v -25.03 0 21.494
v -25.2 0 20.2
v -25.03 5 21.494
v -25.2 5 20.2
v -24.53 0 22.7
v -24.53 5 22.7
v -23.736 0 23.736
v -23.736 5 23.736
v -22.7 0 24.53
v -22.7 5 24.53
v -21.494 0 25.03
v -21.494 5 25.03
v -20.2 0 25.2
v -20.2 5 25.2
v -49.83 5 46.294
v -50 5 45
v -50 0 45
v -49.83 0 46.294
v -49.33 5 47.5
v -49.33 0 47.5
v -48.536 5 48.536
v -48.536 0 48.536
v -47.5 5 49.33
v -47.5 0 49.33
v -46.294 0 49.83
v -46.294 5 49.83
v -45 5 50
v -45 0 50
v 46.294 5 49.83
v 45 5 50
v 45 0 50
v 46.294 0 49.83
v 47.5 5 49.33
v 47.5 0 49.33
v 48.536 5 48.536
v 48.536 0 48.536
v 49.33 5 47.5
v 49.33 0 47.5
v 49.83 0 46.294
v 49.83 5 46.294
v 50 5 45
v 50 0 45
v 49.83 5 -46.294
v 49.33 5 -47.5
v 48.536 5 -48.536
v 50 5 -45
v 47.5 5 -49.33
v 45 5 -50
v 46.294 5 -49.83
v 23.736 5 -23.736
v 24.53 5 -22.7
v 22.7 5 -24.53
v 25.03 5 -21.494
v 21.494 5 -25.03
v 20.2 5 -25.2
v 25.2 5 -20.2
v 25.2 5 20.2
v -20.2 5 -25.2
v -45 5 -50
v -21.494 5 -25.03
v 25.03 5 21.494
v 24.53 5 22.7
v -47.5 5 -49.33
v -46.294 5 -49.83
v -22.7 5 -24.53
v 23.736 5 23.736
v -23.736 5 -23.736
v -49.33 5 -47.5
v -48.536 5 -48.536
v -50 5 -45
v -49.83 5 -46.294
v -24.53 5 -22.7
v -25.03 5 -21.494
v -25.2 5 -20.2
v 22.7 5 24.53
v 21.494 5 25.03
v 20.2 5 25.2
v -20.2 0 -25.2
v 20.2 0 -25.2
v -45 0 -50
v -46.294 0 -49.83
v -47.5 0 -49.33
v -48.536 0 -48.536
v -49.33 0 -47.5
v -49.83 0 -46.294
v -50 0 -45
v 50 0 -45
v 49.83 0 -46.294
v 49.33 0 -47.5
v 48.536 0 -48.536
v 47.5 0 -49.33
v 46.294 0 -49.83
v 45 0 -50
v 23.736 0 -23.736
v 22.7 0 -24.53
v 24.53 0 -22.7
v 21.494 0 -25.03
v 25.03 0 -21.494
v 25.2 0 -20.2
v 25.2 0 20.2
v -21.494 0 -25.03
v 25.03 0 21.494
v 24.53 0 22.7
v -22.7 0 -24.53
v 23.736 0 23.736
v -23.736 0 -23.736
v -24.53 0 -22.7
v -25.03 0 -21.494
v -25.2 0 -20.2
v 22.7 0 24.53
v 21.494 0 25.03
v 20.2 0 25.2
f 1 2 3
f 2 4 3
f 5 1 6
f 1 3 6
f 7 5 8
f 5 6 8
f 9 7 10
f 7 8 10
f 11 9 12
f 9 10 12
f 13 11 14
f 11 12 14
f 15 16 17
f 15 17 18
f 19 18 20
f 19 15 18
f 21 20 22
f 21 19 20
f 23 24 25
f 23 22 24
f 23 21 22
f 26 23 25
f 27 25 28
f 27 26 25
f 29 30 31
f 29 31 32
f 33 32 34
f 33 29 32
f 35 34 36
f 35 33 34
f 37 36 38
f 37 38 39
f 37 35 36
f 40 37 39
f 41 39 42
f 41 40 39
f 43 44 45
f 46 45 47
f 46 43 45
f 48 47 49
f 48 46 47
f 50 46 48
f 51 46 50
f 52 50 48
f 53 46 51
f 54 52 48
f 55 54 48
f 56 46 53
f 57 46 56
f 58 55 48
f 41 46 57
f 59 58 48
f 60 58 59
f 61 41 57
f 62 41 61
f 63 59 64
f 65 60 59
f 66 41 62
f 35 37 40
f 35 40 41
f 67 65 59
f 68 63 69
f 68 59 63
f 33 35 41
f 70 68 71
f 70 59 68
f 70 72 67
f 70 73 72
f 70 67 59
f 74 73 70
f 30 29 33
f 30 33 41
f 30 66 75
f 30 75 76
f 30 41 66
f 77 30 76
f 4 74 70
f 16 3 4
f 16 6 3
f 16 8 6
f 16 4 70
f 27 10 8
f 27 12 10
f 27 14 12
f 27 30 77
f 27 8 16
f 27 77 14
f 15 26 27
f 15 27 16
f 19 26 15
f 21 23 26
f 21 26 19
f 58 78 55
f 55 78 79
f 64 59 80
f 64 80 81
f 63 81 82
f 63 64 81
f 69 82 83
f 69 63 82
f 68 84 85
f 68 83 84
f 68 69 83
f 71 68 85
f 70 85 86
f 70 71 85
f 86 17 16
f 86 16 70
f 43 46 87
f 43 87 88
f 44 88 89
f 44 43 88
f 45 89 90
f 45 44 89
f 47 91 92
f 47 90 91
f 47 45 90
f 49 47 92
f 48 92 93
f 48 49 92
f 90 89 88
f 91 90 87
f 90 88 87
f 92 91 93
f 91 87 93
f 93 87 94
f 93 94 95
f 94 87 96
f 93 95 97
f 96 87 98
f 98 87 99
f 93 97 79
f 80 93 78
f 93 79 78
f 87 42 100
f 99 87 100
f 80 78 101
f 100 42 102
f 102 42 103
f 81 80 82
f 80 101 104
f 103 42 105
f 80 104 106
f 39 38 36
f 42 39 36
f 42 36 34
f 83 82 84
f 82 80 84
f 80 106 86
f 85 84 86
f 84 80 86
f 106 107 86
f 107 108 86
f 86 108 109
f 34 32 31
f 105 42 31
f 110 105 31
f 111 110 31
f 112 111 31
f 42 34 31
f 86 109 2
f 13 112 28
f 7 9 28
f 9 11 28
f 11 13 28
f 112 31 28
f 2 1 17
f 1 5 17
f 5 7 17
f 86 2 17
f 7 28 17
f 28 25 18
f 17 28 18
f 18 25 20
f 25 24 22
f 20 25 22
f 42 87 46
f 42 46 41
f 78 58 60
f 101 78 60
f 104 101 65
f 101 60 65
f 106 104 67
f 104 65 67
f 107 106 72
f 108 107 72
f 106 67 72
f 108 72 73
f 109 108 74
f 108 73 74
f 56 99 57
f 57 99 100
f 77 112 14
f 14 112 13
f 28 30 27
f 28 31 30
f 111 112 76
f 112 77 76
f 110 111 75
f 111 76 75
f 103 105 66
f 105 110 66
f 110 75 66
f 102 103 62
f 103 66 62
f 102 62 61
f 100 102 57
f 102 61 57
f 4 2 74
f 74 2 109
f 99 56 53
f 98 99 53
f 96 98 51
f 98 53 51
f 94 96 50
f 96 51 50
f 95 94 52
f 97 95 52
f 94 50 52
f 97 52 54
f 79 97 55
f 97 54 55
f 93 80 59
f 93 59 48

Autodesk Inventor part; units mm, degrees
ref_plane "YZ Plane" through (0, 0, 0) normal (1, 0, 0) x (0, 1, 0)
ref_plane "XZ Plane" through (0, 0, 0) normal (0, 1, 0) x (-1, 0, 0)
ref_plane "XY Plane" through (0, 0, 0) normal (0, 0, 1) x (1, 0, 0)
sketch "Sketch1" plane through (0, 0, 0) normal (0, 1, 0) x (-1, 0, 0)
  line L0 (-25.2, 25.2) -> (25.2, 25.2)
  line L1 (25.2, 25.2) -> (25.2, -25.2)
  line L2 (25.2, -25.2) -> (-25.2, -25.2)
  line L3 (-25.2, -25.2) -> (-25.2, 25.2)
  line L4 (-25.2, 25.2) -> (25.2, -25.2) construction
  line L5 (25.2, 25.2) -> (-25.2, -25.2) construction
  line L6 (-50, 50) -> (50, 50)
  line L7 (50, 50) -> (50, -50)
  line L8 (50, -50) -> (-50, -50)
  line L9 (-50, -50) -> (-50, 50)
  line L10 (-50, 50) -> (50, -50) construction
  line L11 (50, 50) -> (-50, -50) construction
  point P0 (0, 0)
  dimension "d0" = 50.4
  dimension "d1" = 100
extrude "Extrusion1" add sketch "Sketch1" along normal blind 5
fillet "Fillet1" radius 5 8 edges at (50, 2.5, 50) (50, 2.5, -50) (-50, 2.5, 50) (-50, 2.5, -50) (-25.2, 2.5, -25.2) (25.2, 2.5, -25.2) (-25.2, 2.5, 25.2) (25.2, 2.5, 25.2)
properties part number "PATA" material "Steel, Mild, Welded"
